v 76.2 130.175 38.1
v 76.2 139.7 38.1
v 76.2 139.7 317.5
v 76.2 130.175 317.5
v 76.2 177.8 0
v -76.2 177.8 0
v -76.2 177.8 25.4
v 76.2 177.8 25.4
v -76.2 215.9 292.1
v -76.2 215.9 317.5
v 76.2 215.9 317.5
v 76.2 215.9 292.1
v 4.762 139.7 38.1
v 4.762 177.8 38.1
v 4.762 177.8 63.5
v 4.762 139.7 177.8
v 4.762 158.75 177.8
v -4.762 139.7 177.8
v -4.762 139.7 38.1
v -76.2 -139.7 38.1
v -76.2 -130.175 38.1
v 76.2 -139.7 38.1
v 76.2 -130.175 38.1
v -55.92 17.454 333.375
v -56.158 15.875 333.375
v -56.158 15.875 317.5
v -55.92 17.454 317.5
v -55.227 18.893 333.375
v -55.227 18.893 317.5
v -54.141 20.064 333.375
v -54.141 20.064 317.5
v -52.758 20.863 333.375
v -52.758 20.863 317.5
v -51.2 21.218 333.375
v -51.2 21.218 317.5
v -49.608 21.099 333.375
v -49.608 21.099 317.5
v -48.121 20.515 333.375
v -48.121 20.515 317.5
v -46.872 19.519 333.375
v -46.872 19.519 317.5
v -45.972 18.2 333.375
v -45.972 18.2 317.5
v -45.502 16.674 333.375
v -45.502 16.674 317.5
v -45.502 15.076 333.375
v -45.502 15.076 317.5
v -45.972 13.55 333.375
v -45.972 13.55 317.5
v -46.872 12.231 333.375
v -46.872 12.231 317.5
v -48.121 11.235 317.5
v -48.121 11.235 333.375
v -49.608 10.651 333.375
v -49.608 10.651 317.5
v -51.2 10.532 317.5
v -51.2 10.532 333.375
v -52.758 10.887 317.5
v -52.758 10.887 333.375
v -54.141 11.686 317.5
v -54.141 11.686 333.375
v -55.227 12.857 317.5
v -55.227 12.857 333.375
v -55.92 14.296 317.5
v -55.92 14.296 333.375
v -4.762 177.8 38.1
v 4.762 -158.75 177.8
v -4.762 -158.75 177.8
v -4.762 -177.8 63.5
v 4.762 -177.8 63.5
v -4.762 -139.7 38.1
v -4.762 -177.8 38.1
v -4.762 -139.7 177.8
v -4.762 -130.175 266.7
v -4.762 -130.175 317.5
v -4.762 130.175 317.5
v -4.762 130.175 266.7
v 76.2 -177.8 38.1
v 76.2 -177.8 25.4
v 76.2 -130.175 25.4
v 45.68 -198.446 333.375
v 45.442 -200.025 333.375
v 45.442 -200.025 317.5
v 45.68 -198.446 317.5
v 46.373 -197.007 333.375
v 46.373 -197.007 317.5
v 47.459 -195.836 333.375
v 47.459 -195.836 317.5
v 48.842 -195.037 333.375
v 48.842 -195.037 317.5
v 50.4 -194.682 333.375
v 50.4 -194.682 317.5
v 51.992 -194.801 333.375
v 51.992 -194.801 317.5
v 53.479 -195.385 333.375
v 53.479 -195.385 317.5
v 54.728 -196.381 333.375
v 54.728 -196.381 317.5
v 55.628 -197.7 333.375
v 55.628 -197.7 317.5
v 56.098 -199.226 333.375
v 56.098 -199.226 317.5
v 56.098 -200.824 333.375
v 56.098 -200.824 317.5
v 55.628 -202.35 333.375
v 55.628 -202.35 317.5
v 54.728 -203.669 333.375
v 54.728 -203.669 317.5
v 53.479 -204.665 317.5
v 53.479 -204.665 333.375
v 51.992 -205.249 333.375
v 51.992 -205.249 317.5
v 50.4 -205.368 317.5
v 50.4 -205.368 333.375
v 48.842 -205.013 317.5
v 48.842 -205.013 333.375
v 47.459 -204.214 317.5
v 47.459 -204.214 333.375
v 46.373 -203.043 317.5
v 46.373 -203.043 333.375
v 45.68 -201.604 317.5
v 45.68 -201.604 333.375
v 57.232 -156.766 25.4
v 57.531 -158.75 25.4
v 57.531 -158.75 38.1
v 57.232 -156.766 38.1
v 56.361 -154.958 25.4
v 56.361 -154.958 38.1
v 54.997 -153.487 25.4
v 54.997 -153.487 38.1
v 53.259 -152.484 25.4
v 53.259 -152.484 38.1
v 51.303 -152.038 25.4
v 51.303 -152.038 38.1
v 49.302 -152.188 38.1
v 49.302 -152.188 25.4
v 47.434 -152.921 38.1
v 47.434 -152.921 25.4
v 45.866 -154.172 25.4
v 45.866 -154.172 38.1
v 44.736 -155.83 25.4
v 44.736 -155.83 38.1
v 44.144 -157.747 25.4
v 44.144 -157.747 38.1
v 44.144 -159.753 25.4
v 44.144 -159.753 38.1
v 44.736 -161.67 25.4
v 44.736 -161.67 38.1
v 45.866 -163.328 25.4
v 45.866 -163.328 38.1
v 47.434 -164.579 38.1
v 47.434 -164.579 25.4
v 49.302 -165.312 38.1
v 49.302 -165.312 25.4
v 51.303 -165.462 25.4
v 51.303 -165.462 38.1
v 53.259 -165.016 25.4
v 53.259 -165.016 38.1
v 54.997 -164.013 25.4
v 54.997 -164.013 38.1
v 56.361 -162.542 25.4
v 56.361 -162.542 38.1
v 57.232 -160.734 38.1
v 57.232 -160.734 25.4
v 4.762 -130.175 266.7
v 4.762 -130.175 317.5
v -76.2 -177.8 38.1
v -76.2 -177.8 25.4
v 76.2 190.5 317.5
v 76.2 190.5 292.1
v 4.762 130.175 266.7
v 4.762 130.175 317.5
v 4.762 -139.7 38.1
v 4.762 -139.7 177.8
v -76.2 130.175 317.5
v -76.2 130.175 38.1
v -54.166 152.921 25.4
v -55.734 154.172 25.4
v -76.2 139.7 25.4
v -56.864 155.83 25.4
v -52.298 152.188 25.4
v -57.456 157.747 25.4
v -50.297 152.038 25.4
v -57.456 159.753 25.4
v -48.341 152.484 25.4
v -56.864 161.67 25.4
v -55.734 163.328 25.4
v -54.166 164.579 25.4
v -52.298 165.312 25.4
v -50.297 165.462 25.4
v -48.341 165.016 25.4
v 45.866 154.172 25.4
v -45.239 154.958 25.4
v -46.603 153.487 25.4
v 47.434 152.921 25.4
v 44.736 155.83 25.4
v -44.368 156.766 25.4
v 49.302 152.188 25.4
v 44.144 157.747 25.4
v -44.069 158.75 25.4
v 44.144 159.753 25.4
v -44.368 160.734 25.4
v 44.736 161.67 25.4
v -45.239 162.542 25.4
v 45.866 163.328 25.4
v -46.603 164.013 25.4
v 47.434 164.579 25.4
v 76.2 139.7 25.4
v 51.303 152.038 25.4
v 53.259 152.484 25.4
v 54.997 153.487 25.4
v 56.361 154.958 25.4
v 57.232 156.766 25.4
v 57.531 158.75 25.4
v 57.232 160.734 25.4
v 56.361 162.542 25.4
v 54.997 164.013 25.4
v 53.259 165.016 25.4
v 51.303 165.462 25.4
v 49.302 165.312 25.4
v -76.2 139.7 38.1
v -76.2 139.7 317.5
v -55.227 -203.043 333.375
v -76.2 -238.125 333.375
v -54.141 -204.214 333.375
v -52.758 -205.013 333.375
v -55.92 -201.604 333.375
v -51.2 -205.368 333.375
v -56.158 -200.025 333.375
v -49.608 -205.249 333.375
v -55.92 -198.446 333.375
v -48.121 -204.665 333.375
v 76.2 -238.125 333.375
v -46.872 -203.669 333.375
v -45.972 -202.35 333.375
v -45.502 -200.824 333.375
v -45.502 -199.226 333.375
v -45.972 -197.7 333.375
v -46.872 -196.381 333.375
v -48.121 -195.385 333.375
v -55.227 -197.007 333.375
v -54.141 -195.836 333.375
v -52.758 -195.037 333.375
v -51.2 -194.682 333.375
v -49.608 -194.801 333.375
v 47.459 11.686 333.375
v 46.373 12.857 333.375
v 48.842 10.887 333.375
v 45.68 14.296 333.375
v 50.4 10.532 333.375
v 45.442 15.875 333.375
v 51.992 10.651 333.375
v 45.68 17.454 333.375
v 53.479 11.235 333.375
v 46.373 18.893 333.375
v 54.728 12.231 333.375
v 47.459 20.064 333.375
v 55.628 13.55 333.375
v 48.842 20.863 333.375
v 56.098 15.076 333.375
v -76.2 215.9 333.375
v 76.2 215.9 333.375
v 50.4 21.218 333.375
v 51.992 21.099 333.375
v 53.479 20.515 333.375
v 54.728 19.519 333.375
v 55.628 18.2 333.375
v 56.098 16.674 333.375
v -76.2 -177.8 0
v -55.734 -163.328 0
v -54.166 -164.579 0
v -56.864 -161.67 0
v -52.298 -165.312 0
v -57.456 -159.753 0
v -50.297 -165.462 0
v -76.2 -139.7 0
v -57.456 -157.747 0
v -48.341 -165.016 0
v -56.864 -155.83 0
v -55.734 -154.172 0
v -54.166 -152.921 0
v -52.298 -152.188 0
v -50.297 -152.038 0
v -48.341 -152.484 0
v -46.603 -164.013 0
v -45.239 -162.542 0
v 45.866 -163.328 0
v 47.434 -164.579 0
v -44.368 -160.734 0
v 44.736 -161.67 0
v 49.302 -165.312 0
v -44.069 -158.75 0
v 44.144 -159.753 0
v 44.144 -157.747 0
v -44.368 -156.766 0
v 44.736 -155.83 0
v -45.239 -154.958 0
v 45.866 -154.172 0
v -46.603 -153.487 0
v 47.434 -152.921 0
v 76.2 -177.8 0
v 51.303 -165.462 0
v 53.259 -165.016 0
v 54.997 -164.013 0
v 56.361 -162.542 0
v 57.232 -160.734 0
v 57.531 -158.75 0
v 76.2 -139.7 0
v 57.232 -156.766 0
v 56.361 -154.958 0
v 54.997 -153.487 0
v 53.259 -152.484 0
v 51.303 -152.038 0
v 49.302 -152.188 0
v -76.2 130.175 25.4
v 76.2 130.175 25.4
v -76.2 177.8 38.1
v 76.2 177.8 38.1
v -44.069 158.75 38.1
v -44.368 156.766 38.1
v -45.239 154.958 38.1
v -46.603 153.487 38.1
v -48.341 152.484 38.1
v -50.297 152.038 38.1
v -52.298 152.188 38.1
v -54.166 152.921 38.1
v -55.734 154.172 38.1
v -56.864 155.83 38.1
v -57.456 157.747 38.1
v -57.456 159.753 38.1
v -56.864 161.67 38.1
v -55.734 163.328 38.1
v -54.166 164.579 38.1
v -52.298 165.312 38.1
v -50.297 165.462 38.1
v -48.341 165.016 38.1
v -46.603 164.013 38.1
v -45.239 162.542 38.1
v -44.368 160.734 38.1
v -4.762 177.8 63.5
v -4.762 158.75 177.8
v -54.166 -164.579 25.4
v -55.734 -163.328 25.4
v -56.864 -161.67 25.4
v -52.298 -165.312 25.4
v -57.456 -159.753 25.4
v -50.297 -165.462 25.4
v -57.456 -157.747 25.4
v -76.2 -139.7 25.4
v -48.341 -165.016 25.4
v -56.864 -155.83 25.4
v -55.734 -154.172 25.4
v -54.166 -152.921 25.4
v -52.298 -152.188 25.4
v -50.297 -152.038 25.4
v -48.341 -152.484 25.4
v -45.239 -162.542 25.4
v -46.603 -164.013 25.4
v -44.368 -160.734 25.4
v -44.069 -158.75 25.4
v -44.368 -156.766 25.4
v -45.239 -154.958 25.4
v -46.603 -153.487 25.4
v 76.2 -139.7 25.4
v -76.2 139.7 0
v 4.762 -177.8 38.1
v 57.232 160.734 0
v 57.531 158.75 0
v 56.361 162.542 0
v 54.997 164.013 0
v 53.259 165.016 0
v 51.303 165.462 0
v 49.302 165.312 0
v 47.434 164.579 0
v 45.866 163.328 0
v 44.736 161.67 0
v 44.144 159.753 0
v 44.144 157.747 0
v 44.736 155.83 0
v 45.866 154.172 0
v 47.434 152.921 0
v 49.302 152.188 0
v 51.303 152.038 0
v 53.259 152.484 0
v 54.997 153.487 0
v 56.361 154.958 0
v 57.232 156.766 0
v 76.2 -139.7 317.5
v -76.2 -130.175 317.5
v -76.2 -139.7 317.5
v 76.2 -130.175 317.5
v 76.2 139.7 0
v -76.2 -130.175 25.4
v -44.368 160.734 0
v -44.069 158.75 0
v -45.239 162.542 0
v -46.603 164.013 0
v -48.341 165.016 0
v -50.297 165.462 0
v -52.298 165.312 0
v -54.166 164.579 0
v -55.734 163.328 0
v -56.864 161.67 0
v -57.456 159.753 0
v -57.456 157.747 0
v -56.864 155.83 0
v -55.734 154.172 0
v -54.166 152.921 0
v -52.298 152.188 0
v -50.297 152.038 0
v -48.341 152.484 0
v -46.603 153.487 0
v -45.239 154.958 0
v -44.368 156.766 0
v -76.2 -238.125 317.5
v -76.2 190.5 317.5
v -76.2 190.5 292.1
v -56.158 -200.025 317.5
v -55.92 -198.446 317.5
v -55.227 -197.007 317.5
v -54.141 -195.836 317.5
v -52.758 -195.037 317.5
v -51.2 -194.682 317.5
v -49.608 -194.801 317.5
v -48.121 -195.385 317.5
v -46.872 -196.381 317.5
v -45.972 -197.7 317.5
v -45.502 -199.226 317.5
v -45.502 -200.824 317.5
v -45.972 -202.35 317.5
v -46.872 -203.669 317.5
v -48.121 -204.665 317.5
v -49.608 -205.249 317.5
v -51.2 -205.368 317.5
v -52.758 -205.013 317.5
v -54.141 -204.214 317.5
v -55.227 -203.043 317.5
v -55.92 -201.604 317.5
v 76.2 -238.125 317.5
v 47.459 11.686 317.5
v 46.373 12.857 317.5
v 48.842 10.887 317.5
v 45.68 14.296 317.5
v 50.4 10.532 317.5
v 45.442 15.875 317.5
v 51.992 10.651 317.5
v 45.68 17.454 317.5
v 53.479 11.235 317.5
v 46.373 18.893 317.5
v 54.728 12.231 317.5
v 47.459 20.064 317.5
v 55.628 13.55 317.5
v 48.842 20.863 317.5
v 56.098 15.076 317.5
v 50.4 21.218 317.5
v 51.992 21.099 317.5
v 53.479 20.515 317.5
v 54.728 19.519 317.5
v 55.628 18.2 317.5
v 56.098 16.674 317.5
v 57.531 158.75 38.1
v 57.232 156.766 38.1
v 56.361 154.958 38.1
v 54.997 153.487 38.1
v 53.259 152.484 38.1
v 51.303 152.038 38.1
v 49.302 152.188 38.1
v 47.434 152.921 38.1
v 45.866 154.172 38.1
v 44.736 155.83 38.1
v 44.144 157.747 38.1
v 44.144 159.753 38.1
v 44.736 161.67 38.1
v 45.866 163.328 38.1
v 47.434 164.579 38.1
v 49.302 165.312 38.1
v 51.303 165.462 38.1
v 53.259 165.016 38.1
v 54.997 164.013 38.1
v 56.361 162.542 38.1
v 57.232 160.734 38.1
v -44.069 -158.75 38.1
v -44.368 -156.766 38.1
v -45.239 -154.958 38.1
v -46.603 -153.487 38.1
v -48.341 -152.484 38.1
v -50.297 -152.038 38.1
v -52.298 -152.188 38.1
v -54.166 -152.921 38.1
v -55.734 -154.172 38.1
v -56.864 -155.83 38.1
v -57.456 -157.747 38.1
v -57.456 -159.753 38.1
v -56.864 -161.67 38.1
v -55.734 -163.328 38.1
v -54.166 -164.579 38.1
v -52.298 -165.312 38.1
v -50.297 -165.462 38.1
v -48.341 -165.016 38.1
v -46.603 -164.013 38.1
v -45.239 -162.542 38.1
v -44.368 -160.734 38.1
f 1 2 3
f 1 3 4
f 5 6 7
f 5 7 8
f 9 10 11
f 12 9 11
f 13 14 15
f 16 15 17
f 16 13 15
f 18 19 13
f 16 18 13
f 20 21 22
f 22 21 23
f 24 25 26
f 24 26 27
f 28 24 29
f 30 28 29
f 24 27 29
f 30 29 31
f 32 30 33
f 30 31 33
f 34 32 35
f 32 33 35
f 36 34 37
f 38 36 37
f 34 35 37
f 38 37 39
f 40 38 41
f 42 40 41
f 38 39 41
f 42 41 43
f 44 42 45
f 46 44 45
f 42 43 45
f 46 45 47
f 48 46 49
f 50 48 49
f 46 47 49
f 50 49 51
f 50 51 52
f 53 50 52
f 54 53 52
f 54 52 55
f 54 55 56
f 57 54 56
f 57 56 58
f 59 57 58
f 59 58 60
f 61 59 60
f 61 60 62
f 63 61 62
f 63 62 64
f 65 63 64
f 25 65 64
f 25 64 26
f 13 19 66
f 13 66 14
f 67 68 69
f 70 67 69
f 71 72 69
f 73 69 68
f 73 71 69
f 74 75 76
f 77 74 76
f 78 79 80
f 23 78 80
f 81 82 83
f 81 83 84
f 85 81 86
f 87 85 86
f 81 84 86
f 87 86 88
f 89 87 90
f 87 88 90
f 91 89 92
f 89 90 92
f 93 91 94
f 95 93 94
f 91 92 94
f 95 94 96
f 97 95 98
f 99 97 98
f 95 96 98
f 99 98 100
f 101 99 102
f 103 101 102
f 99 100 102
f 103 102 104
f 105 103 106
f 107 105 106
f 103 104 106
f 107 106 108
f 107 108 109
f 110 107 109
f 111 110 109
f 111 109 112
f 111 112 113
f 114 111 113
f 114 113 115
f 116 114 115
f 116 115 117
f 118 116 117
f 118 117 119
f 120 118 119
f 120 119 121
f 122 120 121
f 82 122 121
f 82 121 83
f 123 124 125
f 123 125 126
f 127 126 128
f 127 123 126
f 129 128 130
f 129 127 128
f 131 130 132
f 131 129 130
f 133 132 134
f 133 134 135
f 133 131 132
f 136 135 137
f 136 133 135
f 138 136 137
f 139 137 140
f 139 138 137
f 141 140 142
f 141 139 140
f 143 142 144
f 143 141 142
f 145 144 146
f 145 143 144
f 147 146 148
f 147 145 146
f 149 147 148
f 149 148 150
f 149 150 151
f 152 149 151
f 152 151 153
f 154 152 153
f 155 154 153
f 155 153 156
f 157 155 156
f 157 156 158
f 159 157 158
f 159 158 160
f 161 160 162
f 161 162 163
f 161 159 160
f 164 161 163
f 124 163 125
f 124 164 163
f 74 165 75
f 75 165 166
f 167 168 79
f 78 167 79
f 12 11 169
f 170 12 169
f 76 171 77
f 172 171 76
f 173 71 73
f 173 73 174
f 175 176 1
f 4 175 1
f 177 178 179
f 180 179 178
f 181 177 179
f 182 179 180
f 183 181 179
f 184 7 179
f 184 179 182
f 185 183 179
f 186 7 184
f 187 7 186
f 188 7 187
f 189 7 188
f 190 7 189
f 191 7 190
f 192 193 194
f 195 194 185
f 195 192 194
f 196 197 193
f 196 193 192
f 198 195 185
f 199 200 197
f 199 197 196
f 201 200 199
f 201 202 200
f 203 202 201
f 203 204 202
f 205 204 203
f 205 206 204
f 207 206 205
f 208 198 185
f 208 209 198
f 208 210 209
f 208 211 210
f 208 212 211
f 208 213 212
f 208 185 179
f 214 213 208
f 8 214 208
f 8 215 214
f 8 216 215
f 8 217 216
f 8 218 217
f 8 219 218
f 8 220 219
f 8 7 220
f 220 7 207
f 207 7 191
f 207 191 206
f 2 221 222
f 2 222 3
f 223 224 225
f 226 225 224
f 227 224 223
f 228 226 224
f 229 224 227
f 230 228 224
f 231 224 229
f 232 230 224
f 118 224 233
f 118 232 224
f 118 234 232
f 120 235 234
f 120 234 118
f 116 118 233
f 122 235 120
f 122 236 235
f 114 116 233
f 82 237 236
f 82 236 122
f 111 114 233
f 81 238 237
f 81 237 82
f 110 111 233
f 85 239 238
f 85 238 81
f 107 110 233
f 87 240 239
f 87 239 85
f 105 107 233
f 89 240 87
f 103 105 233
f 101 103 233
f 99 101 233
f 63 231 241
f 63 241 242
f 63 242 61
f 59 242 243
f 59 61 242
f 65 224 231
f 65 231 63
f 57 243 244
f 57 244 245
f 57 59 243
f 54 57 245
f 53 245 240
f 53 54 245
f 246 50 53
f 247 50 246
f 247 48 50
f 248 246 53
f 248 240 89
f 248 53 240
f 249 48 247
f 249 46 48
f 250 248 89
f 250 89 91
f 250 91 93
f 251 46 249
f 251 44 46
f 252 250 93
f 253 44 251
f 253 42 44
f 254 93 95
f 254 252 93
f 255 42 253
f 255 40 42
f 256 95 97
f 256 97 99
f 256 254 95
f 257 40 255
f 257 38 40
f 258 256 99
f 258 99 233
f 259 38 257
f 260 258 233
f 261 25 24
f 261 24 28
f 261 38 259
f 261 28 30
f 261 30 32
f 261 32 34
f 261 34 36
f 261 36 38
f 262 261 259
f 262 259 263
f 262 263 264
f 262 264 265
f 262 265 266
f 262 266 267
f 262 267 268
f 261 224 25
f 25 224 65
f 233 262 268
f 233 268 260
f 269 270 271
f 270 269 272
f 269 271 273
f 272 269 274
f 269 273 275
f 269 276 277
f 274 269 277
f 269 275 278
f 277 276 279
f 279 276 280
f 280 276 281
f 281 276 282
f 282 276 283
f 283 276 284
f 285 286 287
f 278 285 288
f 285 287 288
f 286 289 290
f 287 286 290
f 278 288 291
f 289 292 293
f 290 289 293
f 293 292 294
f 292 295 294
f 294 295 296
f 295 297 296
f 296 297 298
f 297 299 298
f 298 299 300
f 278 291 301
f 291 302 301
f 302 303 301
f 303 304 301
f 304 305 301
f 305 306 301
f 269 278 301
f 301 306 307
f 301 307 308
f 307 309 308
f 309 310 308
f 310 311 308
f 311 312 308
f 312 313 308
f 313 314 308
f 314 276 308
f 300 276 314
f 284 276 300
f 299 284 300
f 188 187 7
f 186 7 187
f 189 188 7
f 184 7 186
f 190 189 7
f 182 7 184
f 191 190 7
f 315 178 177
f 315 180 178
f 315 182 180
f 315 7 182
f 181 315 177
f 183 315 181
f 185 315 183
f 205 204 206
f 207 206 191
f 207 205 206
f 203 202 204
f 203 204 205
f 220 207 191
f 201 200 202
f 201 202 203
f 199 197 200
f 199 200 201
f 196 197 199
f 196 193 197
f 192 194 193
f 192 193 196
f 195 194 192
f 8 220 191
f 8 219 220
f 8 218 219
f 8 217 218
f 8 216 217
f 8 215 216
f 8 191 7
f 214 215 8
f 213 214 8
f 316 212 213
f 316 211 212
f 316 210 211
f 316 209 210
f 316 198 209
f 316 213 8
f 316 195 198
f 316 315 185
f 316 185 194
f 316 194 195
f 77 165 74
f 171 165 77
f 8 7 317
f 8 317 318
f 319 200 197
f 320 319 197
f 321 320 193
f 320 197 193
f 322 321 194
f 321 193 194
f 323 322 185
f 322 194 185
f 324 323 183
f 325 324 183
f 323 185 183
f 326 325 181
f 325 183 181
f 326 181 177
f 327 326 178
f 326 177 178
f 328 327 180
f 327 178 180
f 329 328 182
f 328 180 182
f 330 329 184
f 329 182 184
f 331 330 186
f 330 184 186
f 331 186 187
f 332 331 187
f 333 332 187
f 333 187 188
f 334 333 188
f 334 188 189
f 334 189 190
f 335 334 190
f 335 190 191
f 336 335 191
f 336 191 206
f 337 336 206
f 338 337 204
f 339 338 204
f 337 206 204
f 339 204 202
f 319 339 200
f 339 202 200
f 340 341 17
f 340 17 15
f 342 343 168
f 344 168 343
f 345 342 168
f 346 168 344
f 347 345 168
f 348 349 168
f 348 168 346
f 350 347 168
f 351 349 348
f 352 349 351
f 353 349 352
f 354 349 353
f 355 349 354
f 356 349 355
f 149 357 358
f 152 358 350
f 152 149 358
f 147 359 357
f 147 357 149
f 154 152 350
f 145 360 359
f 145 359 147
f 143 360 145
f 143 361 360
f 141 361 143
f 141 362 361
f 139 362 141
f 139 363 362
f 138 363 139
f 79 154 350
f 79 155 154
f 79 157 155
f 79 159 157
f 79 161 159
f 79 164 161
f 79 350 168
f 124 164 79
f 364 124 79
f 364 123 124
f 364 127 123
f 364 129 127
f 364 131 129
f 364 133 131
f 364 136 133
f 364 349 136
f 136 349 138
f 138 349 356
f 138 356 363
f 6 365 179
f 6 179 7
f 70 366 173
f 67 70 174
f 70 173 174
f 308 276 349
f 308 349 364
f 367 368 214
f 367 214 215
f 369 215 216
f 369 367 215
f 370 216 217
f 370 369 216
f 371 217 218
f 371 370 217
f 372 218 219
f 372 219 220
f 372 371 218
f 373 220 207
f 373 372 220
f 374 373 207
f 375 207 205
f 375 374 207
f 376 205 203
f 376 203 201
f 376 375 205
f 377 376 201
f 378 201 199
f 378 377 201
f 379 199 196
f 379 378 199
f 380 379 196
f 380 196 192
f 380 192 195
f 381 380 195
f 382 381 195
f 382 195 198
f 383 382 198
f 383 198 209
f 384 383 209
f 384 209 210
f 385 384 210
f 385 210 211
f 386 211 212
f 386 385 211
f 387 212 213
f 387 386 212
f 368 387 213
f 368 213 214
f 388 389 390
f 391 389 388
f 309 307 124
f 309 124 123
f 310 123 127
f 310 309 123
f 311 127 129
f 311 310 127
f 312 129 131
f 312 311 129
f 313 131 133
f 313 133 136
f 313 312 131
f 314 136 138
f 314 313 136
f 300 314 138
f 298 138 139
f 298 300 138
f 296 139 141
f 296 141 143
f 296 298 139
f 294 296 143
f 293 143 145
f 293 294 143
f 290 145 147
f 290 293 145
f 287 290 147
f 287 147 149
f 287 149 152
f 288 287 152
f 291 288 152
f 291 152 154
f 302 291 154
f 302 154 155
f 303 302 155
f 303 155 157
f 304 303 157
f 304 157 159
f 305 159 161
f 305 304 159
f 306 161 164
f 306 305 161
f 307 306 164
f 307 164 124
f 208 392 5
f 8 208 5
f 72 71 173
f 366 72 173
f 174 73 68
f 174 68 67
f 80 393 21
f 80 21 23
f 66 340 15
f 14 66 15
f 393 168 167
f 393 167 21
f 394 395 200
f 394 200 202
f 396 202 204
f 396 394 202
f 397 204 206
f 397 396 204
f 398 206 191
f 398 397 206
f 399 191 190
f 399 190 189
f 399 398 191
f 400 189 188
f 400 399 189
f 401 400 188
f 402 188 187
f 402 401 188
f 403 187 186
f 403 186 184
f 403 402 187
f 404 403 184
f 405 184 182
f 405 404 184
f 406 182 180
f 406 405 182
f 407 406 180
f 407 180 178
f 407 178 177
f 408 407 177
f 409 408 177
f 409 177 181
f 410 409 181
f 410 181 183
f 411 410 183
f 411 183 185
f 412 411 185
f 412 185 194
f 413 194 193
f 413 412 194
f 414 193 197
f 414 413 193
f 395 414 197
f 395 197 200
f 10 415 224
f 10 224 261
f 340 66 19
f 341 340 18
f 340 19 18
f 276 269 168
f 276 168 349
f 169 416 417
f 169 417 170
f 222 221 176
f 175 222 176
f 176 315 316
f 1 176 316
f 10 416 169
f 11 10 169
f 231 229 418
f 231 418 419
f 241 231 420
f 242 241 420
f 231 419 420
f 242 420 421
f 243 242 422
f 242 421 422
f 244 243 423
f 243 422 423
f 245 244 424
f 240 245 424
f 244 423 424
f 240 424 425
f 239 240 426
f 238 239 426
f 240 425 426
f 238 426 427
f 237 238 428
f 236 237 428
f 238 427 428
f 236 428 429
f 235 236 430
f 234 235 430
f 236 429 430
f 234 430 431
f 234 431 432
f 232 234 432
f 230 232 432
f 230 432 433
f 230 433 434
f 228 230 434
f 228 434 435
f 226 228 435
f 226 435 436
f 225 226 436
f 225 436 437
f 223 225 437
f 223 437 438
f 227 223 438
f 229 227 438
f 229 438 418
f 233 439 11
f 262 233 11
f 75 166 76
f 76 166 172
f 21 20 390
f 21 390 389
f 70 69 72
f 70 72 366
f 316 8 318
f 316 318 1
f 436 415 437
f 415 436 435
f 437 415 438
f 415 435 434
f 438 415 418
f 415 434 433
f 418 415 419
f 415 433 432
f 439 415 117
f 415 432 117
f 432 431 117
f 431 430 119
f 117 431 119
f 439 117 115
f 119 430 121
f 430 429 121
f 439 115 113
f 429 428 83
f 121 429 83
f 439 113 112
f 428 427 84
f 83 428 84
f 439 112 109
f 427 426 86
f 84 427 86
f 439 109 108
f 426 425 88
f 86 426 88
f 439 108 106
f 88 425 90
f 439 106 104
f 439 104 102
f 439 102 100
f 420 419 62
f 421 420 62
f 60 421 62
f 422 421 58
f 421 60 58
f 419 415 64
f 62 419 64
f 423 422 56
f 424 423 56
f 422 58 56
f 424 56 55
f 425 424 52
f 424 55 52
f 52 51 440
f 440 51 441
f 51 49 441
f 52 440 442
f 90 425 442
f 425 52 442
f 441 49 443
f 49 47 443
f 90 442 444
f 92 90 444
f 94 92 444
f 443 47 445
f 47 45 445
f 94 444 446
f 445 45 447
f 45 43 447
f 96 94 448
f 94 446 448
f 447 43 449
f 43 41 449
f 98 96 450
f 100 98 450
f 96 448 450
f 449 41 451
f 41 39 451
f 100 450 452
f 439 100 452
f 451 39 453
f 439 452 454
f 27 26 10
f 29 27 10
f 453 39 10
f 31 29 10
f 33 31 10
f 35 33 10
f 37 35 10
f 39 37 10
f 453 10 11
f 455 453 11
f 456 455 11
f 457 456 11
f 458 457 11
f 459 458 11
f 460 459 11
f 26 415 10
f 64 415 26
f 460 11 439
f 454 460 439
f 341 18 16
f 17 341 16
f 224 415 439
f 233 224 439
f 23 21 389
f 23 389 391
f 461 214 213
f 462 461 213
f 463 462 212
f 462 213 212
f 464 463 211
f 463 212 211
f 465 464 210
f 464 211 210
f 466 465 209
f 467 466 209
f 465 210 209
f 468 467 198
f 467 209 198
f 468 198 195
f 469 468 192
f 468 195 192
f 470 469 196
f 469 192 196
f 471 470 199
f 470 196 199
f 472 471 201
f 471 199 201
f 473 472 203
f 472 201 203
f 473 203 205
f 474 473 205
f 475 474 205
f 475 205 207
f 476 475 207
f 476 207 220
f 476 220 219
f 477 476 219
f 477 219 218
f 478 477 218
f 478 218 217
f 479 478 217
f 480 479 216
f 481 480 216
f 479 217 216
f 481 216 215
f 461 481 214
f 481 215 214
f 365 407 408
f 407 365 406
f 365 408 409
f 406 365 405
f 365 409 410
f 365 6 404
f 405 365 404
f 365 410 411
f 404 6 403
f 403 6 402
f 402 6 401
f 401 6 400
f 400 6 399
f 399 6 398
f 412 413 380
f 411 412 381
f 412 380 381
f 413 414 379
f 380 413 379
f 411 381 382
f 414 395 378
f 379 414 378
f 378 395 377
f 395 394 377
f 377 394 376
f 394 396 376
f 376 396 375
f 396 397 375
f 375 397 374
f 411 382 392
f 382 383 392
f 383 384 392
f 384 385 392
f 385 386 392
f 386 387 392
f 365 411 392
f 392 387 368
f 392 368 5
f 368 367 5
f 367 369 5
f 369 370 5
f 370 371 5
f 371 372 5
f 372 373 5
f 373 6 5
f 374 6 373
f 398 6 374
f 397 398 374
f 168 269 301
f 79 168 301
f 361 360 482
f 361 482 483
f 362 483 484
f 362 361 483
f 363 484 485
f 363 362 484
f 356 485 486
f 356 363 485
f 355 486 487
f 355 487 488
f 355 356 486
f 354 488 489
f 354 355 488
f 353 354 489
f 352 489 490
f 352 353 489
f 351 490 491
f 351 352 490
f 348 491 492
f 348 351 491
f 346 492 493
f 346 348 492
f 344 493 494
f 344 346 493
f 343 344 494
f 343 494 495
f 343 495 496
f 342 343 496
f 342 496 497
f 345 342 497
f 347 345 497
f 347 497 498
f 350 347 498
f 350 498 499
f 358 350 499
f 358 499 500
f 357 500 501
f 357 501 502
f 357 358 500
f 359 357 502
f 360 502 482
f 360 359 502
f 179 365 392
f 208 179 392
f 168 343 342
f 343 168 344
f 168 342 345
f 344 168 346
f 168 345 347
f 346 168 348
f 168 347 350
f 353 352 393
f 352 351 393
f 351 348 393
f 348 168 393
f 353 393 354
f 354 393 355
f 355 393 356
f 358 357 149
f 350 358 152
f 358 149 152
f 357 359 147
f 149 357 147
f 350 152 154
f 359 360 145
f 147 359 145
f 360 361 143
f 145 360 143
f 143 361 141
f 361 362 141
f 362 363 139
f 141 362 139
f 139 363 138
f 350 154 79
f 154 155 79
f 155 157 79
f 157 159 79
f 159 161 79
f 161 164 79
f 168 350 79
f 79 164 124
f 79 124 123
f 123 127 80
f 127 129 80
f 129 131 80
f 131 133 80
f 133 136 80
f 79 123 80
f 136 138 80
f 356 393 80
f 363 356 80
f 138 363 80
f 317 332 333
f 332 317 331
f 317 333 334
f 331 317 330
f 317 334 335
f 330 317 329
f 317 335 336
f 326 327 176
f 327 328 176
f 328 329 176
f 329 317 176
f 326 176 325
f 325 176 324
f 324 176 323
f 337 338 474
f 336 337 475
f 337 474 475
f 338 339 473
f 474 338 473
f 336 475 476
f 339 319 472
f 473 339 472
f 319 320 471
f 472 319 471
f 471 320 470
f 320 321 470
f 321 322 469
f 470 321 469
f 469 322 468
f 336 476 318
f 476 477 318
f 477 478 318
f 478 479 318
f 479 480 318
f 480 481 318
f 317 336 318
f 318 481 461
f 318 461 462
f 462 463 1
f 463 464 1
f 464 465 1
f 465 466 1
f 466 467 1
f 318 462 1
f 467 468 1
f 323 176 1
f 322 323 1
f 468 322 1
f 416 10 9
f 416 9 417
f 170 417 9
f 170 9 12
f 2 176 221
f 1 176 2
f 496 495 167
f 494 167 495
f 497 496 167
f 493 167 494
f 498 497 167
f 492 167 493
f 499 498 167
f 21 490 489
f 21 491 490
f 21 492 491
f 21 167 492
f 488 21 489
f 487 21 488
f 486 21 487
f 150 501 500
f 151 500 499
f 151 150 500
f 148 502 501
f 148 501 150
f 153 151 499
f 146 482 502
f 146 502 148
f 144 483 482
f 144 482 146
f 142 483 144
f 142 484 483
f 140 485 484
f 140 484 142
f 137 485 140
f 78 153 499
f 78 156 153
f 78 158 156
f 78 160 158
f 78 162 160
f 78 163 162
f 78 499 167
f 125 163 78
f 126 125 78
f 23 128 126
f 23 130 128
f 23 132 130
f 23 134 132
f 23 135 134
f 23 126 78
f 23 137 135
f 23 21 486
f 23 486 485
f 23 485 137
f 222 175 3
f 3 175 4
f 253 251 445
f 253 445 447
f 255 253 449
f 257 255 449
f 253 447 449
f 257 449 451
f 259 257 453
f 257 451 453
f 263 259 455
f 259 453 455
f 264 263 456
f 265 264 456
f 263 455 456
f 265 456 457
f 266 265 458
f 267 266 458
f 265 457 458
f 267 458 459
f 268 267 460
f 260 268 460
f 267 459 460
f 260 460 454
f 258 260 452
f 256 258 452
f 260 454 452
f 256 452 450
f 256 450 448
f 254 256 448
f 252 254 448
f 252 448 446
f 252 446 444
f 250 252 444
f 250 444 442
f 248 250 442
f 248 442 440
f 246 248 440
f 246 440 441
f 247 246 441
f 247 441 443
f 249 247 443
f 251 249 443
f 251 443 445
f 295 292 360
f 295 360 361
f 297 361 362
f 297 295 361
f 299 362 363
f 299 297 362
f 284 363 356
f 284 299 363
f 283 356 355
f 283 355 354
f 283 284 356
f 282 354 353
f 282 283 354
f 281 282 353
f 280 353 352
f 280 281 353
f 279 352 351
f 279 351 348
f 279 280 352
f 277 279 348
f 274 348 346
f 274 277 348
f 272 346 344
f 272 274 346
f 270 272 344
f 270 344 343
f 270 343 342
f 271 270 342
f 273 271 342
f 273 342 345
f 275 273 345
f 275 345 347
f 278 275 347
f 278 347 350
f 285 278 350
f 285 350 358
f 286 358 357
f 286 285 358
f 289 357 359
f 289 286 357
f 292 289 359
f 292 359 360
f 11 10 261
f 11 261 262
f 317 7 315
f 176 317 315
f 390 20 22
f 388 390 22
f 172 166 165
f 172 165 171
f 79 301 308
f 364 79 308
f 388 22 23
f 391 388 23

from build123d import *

# Parameters (mm, degrees)
F0_W      = 152.4
F0_H      = 38.1
F0_R      = 6.731
F1_DEPTH  = 25.4
F2_W      = 152.4
F2_H      = 47.625
F2_R      = 6.731
F3_DEPTH  = 12.7
F4_W      = 152.4
F4_H      = 9.525
F5_DEPTH  = 279.4
F7_W      = 152.4
F7_H      = 454.025
F8_DEPTH  = 15.875
F9_W      = 152.4
F9_H      = 25.4
F10_DEPTH = 25.4
F11_W     = 260.35
F11_H     = 50.8
F12_DEPTH = 4.7625
F13_W     = 9.525
F13_H     = 139.7
F14_DEPTH = 38.1
F16_DEPTH = 80.9635
F19_D     = 10.71626
F19_DEPTH = 25.3941384615
F19_TIP   = 3.2194893086


with BuildPart() as f1:
    # F0 (on Top) → F1 (new body)
    with BuildSketch(Plane.XY):
        with Locations((0, -158.75)):
            Rectangle(F0_W, F0_H)
        with Locations((-50.8, -158.75)):
            Circle(F0_R, mode=Mode.SUBTRACT)
        with Locations((50.8, -158.75)):
            Circle(F0_R, mode=Mode.SUBTRACT)
    extrude(amount=F1_DEPTH)


with BuildPart() as f1b:
    # F0 (on Top) → F1, piece 2 (new body)
    with BuildSketch(Plane.XY):
        with Locations((0, 158.75)):
            Rectangle(F0_W, F0_H)
        with Locations((-50.8, 158.75)):
            Circle(F0_R, mode=Mode.SUBTRACT)
        with Locations((50.8, 158.75)):
            Circle(F0_R, mode=Mode.SUBTRACT)
    extrude(amount=F1_DEPTH)


with BuildPart() as f3:
    # F2 (on face) → F3 (new body)
    with BuildSketch(Plane.XY.offset(25.4)):
        with Locations((0, -153.9875)):
            Rectangle(F2_W, F2_H)
        with Locations((-50.8, -158.75)):
            Circle(F2_R, mode=Mode.SUBTRACT)
        with Locations((50.8, -158.75)):
            Circle(F2_R, mode=Mode.SUBTRACT)
    extrude(amount=F3_DEPTH)


with BuildPart() as f5:
    # F4 (on face) → F5 (new body)
    with BuildSketch(Plane.XY.offset(38.1)):
        with Locations((0, -134.9375)):
            Rectangle(F4_W, F4_H)
    extrude(amount=F5_DEPTH)


with BuildPart() as f6_1:
    # F6: instance of F3
    add(f3.part.mirror(Plane.XZ))


with BuildPart() as f6_2:
    # F6: instance of F5
    add(f5.part.mirror(Plane.XZ))


with BuildPart() as f8:
    # F7 (on face) → F8 (new body)
    with BuildSketch(Plane.XY.offset(317.5)):
        with Locations((0, -11.1125)):
            Rectangle(F7_W, F7_H)
    extrude(amount=F8_DEPTH)

    # F19
    with Locations(Plane.XY.offset(333.375)):
        with Locations((50.8, 15.875), (-50.8, 15.875), (50.8, -200.025), (-50.8, -200.025)):
            Hole(F19_D / 2, depth=F19_DEPTH)
            with Locations((0, 0, -(F19_DEPTH + F19_TIP / 2))):  # 118° drill point
                Cone(0, F19_D / 2, F19_TIP, mode=Mode.SUBTRACT)


with BuildPart() as f10:
    # F9 (on face) → F10 (new body)
    with BuildSketch(Plane(origin=(0, 0, 317.5), x_dir=(1, 0, 0), z_dir=(0, 0, -1))):
        with Locations((0, -203.2)):
            Rectangle(F9_W, F9_H)
    extrude(amount=F10_DEPTH)


with BuildPart() as f12:
    # F11 (on Right) → F12 (new body, symmetric)
    with BuildSketch(Plane.YZ):
        with Locations((0, 292.1)):
            Rectangle(F11_W, F11_H)
    extrude(amount=F12_DEPTH, both=True)


with BuildPart() as f14:
    # F13 (on face) → F14 (new body)
    with BuildSketch(Plane.XZ.offset(139.7)):
        with Locations((0, 107.95)):
            Rectangle(F13_W, F13_H)
    extrude(amount=F14_DEPTH)

    # F15 (on face) → F16 (cut, through all)
    with BuildSketch(Plane(origin=(-4.7625, 0, 0), x_dir=(0, -1, 0), z_dir=(-1, 0, 0))):
        Polygon((158.75, 177.8), (177.8, 63.5), (177.8, 177.8), align=None)
    extrude(amount=-F16_DEPTH, mode=Mode.SUBTRACT)


with BuildPart() as f17_1:
    # F17: instance of F14
    add(f14.part.mirror(Plane.XZ))


solid = Compound([f1.part, f1b.part, f3.part, f5.part, f6_1.part, f6_2.part, f8.part, f10.part, f12.part, f14.part, f17_1.part])
